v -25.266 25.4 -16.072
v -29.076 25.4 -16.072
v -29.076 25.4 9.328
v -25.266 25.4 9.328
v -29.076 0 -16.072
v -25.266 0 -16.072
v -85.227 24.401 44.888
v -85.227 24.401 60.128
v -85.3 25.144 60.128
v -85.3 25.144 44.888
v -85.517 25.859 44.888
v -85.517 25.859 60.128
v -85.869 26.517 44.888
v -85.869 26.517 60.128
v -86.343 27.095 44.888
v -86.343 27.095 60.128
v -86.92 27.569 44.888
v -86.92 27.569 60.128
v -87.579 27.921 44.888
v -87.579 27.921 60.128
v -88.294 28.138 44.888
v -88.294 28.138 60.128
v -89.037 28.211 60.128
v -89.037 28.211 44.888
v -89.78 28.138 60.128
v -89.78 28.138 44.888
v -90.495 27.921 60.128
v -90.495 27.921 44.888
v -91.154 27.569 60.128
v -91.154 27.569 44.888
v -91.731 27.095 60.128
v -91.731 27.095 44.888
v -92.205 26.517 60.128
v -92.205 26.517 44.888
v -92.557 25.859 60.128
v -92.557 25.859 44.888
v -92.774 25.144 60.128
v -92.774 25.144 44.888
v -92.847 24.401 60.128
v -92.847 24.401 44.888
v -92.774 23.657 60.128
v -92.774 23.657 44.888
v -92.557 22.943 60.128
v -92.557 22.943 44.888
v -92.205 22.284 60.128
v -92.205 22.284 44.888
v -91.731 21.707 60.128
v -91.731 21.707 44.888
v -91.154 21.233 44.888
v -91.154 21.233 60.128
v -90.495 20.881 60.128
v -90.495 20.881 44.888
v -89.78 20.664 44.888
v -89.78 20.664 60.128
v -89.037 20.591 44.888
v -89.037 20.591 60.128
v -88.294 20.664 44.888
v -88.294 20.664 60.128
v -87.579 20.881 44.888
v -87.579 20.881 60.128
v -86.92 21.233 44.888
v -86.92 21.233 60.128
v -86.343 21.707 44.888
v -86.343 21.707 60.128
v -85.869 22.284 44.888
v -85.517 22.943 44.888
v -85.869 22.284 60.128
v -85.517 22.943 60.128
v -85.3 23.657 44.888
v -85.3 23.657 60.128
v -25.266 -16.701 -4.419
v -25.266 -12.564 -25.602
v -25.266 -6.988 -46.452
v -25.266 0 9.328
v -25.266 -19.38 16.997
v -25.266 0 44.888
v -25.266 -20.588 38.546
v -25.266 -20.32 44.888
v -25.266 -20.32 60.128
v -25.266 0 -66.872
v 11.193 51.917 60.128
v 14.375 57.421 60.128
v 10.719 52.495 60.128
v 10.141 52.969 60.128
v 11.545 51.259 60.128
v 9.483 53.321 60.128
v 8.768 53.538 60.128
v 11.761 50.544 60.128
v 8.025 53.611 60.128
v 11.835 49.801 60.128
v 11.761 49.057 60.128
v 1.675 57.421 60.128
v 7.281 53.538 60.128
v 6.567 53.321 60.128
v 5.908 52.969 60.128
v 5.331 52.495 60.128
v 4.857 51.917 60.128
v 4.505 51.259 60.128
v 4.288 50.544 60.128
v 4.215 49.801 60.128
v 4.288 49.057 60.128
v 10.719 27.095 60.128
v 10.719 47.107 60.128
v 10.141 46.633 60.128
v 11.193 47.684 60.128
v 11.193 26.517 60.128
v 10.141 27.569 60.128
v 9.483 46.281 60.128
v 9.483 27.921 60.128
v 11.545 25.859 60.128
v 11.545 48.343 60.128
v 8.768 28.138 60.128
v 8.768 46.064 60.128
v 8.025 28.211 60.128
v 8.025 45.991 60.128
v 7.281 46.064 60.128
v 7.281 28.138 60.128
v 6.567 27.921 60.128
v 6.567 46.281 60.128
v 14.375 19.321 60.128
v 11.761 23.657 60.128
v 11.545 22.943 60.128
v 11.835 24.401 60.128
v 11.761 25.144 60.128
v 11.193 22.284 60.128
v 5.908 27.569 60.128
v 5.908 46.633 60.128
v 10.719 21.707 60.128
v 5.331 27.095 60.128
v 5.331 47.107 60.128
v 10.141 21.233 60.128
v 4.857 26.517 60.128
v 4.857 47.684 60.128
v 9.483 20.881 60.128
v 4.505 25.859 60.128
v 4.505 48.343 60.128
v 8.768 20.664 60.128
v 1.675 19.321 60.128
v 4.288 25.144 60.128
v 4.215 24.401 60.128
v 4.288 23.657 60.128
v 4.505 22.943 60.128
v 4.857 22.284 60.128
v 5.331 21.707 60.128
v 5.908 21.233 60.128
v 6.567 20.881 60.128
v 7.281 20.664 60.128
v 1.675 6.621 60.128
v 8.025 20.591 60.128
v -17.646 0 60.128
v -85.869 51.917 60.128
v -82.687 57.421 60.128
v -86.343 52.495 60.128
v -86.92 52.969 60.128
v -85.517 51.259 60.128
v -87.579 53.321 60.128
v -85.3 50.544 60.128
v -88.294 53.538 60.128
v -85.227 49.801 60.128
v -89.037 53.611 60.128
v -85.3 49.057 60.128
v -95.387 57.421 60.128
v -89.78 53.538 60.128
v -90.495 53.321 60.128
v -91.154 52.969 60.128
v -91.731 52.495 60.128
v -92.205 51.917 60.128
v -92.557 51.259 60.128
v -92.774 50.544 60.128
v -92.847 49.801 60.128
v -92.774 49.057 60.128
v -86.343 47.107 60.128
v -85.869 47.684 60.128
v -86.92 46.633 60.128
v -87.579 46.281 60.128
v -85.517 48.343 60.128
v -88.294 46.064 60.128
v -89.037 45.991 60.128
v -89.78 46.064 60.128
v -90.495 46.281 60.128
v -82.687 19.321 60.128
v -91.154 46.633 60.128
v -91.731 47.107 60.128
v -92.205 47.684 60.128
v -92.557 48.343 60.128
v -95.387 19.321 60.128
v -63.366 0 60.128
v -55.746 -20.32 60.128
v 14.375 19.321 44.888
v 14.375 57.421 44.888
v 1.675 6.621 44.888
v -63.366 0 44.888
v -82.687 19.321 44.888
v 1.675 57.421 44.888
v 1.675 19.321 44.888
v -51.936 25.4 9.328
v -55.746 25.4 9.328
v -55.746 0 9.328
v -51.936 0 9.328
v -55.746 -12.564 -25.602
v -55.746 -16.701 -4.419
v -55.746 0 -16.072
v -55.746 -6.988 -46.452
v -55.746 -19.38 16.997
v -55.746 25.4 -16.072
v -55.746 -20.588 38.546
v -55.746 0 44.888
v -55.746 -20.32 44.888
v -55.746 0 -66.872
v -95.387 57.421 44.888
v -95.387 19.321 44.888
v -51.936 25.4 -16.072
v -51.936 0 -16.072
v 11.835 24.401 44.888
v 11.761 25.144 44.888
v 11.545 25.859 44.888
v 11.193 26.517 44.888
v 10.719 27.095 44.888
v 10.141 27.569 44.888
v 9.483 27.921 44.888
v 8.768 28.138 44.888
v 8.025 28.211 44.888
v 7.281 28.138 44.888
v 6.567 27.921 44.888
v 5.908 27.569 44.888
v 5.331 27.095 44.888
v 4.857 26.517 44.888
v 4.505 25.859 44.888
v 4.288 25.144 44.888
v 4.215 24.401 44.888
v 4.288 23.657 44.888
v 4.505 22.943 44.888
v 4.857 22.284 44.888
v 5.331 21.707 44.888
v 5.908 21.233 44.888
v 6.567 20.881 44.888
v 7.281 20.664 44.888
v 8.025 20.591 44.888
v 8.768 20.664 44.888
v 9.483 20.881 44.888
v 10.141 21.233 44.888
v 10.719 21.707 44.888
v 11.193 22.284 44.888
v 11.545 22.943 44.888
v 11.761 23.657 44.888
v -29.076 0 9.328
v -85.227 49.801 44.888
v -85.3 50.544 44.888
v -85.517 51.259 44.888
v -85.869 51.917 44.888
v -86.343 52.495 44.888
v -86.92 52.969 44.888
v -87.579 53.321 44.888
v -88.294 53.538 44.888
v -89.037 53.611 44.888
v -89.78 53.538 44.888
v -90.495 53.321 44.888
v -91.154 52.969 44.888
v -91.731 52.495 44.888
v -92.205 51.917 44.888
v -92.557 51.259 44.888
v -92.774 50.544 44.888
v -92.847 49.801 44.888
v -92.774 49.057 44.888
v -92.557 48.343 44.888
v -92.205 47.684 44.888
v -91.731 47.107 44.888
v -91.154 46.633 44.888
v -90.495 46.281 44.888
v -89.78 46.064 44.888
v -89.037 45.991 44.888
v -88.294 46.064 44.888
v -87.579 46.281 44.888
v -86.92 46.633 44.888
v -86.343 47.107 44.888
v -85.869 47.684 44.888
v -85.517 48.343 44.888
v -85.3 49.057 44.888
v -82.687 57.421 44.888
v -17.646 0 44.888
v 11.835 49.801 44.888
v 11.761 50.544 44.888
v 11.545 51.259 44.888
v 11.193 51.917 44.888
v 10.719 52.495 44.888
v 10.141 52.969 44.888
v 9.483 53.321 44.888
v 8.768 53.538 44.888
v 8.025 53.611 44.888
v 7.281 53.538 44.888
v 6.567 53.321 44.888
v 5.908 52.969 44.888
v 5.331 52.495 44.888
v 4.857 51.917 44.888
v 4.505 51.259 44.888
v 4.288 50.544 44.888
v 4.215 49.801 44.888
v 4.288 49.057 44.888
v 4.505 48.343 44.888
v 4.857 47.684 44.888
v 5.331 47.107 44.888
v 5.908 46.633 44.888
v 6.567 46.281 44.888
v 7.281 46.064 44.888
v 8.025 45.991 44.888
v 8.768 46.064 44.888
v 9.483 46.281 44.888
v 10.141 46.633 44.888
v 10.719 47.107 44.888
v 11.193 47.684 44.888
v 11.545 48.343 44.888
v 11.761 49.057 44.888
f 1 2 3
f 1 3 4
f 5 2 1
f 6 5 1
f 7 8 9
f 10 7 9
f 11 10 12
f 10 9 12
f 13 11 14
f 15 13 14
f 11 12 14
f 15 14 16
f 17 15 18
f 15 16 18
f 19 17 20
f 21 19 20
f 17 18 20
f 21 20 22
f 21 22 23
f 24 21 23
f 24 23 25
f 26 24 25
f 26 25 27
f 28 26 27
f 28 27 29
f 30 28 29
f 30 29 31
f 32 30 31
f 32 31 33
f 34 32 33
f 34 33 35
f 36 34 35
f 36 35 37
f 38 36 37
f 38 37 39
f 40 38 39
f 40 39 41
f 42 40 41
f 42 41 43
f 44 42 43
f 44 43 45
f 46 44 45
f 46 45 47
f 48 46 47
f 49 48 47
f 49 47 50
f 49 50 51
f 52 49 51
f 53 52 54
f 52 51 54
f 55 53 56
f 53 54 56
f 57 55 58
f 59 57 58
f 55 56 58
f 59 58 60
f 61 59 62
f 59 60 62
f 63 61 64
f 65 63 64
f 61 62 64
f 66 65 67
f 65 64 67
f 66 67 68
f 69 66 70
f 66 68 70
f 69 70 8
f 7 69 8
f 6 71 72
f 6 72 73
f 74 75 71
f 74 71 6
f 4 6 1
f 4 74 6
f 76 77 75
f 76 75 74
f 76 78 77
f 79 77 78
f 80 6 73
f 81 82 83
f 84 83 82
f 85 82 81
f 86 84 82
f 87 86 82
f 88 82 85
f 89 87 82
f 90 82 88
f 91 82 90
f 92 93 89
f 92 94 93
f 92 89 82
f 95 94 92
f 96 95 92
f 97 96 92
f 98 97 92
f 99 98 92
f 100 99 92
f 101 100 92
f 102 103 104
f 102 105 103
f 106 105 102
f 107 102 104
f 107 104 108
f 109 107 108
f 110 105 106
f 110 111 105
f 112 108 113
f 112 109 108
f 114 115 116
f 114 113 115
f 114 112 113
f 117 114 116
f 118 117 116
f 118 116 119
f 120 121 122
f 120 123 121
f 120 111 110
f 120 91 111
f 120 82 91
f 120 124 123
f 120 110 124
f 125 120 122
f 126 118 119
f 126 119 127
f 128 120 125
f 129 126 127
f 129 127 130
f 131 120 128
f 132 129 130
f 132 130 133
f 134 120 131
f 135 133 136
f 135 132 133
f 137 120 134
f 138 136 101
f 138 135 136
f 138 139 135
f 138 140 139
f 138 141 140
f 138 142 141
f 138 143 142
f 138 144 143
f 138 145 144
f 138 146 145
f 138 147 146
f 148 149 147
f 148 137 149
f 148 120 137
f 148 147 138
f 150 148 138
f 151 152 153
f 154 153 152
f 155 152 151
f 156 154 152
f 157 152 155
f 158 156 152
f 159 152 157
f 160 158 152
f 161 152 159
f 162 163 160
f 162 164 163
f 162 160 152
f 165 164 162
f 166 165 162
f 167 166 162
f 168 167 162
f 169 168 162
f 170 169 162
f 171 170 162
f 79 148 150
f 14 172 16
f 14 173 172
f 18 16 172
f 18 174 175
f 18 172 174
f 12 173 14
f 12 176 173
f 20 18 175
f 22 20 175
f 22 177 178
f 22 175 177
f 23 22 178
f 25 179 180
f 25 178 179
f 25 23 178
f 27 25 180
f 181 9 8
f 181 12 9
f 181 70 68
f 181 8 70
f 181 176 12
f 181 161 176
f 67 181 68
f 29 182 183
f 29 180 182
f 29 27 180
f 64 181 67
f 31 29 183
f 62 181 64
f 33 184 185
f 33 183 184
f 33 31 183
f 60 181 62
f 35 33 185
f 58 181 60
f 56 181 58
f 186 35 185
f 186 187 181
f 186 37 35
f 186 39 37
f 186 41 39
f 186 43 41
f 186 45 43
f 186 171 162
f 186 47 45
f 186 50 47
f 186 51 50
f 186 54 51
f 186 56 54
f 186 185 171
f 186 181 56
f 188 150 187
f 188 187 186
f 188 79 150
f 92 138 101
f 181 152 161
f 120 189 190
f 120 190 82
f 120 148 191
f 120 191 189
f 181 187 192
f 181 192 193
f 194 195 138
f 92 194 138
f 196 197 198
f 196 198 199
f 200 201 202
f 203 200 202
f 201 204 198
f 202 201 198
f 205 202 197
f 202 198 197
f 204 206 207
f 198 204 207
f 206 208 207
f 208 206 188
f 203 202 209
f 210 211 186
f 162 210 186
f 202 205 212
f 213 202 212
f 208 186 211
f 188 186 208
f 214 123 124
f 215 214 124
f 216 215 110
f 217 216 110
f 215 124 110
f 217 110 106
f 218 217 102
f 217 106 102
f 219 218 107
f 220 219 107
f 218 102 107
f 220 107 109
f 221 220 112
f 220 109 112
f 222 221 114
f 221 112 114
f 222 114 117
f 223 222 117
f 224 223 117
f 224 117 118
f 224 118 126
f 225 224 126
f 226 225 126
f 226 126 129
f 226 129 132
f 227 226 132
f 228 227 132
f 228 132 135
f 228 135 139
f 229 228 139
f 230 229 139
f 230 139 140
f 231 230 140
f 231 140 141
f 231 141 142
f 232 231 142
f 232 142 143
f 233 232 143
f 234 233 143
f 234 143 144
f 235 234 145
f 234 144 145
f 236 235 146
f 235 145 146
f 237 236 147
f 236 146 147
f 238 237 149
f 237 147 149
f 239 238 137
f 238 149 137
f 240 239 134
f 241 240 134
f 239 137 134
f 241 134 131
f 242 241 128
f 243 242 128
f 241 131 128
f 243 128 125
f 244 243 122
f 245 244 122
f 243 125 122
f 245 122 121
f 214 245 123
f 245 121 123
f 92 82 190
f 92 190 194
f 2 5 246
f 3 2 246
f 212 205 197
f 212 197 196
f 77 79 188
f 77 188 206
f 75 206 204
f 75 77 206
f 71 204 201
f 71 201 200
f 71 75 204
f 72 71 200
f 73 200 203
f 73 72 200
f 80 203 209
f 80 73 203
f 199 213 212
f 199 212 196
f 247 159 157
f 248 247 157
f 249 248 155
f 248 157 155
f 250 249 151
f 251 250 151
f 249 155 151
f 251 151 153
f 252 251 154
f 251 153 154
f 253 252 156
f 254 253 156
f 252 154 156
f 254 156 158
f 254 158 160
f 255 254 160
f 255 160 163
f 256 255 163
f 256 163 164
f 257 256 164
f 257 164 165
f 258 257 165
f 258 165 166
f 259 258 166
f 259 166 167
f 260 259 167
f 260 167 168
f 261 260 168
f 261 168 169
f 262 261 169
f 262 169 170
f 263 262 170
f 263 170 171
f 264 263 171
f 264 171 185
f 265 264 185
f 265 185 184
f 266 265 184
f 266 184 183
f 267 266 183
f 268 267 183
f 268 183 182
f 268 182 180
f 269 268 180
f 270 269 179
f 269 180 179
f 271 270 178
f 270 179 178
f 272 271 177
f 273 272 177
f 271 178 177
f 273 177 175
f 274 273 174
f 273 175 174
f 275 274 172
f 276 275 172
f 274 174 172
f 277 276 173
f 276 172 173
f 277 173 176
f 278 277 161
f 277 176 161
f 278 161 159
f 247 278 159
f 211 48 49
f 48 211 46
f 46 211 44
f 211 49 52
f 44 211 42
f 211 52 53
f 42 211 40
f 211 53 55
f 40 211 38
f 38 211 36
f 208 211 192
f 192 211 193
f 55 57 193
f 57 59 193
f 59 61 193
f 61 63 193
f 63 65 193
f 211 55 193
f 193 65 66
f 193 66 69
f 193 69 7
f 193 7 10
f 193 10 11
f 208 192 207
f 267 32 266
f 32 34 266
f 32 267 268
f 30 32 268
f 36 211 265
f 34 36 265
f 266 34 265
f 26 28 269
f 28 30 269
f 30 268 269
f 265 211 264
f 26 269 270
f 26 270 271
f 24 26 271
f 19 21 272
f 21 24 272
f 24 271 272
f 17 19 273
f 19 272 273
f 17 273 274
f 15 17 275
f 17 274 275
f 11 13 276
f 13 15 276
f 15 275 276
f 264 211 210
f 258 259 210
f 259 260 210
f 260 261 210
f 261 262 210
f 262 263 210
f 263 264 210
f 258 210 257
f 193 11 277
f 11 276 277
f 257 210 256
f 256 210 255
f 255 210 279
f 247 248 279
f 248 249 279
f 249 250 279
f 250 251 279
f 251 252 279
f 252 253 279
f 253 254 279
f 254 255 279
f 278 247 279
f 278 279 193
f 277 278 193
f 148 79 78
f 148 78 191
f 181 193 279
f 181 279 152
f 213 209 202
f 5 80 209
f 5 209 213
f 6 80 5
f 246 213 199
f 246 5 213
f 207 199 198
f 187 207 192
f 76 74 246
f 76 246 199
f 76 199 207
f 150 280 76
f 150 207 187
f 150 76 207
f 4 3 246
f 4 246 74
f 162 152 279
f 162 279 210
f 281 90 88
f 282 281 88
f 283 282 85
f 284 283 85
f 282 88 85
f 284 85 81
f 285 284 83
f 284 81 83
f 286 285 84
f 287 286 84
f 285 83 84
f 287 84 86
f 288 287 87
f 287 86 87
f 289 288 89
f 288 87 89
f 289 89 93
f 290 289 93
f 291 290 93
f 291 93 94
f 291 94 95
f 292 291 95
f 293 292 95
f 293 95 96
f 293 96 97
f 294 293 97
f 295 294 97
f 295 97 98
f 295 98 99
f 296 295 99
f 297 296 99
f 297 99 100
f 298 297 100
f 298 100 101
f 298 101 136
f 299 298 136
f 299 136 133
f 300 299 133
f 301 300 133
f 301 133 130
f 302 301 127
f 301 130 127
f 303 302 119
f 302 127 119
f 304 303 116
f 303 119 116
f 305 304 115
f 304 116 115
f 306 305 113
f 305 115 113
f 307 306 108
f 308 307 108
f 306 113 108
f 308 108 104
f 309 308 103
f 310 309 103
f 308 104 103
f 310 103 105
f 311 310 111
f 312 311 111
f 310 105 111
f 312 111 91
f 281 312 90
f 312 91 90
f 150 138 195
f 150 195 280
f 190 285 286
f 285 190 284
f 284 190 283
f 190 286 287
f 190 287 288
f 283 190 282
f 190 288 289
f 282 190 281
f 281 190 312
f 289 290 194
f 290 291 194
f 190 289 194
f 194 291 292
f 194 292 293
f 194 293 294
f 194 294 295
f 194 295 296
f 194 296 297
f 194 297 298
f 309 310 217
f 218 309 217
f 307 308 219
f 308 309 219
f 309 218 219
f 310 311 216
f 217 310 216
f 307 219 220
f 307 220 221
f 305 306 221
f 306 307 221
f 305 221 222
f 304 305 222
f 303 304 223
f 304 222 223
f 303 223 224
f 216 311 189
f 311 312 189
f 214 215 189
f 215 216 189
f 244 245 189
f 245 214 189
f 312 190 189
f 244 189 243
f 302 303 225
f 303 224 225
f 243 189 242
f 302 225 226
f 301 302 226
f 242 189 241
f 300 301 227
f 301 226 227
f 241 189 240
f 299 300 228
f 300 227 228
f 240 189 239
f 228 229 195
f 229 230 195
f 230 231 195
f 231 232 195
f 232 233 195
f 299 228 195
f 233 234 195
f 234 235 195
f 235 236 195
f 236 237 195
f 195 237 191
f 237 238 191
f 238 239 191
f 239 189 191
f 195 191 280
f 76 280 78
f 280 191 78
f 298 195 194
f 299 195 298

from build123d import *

# Parameters (mm, degrees)
F0_W          = 3.81
F0_H          = 25.4
F1_DEPTH      = 7.62
F2_DEPTH      = 25.4
F2_DEPTH_BACK = 7.62
F4_DEPTH      = 30.48
F6_DEPTH      = 15.24
F6_FACE_W     = 12.7
F6_FACE_H     = 15.24
F7_DEPTH      = 38.1
F8_R          = 3.81
F9_DEPTH      = 25.4


with BuildPart() as f1:
    # F0 (on Front) → F1 (new body)
    with BuildSketch(Plane.XZ):
        Polygon((-25.266106, 34.727762), (-55.746106, 34.727762), (-55.746106, 9.327762), (-51.936106, 9.327762), (-51.936106, -16.072238), (-55.746106, -16.072238), (-55.746106, -41.472238), (-25.266106, -41.472238), (-25.266106, -16.072238), (-29.076106, -16.072238), (-29.076106, 9.327762), (-25.266106, 9.327762), align=None)
        with Locations((-53.841106, -3.372238)):
            Rectangle(F0_W, F0_H)
        with Locations((-27.171106, -3.372238)):
            Rectangle(F0_W, F0_H)
    extrude(amount=F1_DEPTH)

    # F0 (on Front) → F2 (join, two sides)
    with BuildSketch(Plane.XZ) as f2_sk:
        with Locations((-53.841106, -3.372238)):
            Rectangle(F0_W, F0_H)
        with Locations((-27.171106, -3.372238)):
            Rectangle(F0_W, F0_H)
    extrude(amount=-F2_DEPTH)
    extrude(f2_sk.sketch, amount=-F2_DEPTH_BACK)

    # F3 (on face) → F4 (join)
    with BuildSketch(Plane.YZ.offset(-25.266106)):
        with BuildLine():
            Line((-7.62, 34.727762), (0, 34.727762))
            Line((0, 34.727762), (0, 60.127762))
            Line((0, 60.127762), (-20.32, 60.127762))
            ThreePointArc((-20.32, 60.127762), (-16.700865, -4.418776), (0, -66.872238))
            Line((0, -66.872238), (0, -41.472238))
            Line((0, -41.472238), (-7.62, -41.472238))
            Line((-7.62, -41.472238), (-7.62, 34.727762))
        make_face()
    extrude(amount=-F4_DEPTH)

    # F5 (on face) → F6 (join)
    with BuildSketch(Plane.XY.offset(60.127762)):
        Polygon((-25.266106, 0), (-25.266106, -20.32), (1.674663, 6.620768), (14.374663, 19.320768), (1.674663, 19.320768), (-17.646106, 0), align=None)
        Polygon((-82.686874, 6.620768), (-55.746106, -20.32), (-55.746106, 0), (-63.366106, 0), (-82.686874, 19.320768), (-95.386874, 19.320768), align=None)
    extrude(amount=-F6_DEPTH)

    # F6_face (on face) → F7 (join)
    with BuildSketch(Plane(origin=(8.024663, 19.320768, 52.507762), x_dir=(-1, 0, 0), z_dir=(0, 1, 0))):
        Rectangle(F6_FACE_W, F6_FACE_H)
        with Locations((97.061537, 0)):
            Rectangle(F6_FACE_W, F6_FACE_H)
    extrude(amount=F7_DEPTH)

    # F8 (on face) → F9 (cut)
    with BuildSketch(Plane.XY.offset(60.127762)):
        with Locations((-89.036874, 49.800768)):
            Circle(F8_R)
        with Locations((-89.036874, 24.400768)):
            Circle(F8_R)
        with Locations((8.024663, 49.800768)):
            Circle(F8_R)
        with Locations((8.024663, 24.400768)):
            Circle(F8_R)
    extrude(amount=-F9_DEPTH, mode=Mode.SUBTRACT)


solid = f1.part
